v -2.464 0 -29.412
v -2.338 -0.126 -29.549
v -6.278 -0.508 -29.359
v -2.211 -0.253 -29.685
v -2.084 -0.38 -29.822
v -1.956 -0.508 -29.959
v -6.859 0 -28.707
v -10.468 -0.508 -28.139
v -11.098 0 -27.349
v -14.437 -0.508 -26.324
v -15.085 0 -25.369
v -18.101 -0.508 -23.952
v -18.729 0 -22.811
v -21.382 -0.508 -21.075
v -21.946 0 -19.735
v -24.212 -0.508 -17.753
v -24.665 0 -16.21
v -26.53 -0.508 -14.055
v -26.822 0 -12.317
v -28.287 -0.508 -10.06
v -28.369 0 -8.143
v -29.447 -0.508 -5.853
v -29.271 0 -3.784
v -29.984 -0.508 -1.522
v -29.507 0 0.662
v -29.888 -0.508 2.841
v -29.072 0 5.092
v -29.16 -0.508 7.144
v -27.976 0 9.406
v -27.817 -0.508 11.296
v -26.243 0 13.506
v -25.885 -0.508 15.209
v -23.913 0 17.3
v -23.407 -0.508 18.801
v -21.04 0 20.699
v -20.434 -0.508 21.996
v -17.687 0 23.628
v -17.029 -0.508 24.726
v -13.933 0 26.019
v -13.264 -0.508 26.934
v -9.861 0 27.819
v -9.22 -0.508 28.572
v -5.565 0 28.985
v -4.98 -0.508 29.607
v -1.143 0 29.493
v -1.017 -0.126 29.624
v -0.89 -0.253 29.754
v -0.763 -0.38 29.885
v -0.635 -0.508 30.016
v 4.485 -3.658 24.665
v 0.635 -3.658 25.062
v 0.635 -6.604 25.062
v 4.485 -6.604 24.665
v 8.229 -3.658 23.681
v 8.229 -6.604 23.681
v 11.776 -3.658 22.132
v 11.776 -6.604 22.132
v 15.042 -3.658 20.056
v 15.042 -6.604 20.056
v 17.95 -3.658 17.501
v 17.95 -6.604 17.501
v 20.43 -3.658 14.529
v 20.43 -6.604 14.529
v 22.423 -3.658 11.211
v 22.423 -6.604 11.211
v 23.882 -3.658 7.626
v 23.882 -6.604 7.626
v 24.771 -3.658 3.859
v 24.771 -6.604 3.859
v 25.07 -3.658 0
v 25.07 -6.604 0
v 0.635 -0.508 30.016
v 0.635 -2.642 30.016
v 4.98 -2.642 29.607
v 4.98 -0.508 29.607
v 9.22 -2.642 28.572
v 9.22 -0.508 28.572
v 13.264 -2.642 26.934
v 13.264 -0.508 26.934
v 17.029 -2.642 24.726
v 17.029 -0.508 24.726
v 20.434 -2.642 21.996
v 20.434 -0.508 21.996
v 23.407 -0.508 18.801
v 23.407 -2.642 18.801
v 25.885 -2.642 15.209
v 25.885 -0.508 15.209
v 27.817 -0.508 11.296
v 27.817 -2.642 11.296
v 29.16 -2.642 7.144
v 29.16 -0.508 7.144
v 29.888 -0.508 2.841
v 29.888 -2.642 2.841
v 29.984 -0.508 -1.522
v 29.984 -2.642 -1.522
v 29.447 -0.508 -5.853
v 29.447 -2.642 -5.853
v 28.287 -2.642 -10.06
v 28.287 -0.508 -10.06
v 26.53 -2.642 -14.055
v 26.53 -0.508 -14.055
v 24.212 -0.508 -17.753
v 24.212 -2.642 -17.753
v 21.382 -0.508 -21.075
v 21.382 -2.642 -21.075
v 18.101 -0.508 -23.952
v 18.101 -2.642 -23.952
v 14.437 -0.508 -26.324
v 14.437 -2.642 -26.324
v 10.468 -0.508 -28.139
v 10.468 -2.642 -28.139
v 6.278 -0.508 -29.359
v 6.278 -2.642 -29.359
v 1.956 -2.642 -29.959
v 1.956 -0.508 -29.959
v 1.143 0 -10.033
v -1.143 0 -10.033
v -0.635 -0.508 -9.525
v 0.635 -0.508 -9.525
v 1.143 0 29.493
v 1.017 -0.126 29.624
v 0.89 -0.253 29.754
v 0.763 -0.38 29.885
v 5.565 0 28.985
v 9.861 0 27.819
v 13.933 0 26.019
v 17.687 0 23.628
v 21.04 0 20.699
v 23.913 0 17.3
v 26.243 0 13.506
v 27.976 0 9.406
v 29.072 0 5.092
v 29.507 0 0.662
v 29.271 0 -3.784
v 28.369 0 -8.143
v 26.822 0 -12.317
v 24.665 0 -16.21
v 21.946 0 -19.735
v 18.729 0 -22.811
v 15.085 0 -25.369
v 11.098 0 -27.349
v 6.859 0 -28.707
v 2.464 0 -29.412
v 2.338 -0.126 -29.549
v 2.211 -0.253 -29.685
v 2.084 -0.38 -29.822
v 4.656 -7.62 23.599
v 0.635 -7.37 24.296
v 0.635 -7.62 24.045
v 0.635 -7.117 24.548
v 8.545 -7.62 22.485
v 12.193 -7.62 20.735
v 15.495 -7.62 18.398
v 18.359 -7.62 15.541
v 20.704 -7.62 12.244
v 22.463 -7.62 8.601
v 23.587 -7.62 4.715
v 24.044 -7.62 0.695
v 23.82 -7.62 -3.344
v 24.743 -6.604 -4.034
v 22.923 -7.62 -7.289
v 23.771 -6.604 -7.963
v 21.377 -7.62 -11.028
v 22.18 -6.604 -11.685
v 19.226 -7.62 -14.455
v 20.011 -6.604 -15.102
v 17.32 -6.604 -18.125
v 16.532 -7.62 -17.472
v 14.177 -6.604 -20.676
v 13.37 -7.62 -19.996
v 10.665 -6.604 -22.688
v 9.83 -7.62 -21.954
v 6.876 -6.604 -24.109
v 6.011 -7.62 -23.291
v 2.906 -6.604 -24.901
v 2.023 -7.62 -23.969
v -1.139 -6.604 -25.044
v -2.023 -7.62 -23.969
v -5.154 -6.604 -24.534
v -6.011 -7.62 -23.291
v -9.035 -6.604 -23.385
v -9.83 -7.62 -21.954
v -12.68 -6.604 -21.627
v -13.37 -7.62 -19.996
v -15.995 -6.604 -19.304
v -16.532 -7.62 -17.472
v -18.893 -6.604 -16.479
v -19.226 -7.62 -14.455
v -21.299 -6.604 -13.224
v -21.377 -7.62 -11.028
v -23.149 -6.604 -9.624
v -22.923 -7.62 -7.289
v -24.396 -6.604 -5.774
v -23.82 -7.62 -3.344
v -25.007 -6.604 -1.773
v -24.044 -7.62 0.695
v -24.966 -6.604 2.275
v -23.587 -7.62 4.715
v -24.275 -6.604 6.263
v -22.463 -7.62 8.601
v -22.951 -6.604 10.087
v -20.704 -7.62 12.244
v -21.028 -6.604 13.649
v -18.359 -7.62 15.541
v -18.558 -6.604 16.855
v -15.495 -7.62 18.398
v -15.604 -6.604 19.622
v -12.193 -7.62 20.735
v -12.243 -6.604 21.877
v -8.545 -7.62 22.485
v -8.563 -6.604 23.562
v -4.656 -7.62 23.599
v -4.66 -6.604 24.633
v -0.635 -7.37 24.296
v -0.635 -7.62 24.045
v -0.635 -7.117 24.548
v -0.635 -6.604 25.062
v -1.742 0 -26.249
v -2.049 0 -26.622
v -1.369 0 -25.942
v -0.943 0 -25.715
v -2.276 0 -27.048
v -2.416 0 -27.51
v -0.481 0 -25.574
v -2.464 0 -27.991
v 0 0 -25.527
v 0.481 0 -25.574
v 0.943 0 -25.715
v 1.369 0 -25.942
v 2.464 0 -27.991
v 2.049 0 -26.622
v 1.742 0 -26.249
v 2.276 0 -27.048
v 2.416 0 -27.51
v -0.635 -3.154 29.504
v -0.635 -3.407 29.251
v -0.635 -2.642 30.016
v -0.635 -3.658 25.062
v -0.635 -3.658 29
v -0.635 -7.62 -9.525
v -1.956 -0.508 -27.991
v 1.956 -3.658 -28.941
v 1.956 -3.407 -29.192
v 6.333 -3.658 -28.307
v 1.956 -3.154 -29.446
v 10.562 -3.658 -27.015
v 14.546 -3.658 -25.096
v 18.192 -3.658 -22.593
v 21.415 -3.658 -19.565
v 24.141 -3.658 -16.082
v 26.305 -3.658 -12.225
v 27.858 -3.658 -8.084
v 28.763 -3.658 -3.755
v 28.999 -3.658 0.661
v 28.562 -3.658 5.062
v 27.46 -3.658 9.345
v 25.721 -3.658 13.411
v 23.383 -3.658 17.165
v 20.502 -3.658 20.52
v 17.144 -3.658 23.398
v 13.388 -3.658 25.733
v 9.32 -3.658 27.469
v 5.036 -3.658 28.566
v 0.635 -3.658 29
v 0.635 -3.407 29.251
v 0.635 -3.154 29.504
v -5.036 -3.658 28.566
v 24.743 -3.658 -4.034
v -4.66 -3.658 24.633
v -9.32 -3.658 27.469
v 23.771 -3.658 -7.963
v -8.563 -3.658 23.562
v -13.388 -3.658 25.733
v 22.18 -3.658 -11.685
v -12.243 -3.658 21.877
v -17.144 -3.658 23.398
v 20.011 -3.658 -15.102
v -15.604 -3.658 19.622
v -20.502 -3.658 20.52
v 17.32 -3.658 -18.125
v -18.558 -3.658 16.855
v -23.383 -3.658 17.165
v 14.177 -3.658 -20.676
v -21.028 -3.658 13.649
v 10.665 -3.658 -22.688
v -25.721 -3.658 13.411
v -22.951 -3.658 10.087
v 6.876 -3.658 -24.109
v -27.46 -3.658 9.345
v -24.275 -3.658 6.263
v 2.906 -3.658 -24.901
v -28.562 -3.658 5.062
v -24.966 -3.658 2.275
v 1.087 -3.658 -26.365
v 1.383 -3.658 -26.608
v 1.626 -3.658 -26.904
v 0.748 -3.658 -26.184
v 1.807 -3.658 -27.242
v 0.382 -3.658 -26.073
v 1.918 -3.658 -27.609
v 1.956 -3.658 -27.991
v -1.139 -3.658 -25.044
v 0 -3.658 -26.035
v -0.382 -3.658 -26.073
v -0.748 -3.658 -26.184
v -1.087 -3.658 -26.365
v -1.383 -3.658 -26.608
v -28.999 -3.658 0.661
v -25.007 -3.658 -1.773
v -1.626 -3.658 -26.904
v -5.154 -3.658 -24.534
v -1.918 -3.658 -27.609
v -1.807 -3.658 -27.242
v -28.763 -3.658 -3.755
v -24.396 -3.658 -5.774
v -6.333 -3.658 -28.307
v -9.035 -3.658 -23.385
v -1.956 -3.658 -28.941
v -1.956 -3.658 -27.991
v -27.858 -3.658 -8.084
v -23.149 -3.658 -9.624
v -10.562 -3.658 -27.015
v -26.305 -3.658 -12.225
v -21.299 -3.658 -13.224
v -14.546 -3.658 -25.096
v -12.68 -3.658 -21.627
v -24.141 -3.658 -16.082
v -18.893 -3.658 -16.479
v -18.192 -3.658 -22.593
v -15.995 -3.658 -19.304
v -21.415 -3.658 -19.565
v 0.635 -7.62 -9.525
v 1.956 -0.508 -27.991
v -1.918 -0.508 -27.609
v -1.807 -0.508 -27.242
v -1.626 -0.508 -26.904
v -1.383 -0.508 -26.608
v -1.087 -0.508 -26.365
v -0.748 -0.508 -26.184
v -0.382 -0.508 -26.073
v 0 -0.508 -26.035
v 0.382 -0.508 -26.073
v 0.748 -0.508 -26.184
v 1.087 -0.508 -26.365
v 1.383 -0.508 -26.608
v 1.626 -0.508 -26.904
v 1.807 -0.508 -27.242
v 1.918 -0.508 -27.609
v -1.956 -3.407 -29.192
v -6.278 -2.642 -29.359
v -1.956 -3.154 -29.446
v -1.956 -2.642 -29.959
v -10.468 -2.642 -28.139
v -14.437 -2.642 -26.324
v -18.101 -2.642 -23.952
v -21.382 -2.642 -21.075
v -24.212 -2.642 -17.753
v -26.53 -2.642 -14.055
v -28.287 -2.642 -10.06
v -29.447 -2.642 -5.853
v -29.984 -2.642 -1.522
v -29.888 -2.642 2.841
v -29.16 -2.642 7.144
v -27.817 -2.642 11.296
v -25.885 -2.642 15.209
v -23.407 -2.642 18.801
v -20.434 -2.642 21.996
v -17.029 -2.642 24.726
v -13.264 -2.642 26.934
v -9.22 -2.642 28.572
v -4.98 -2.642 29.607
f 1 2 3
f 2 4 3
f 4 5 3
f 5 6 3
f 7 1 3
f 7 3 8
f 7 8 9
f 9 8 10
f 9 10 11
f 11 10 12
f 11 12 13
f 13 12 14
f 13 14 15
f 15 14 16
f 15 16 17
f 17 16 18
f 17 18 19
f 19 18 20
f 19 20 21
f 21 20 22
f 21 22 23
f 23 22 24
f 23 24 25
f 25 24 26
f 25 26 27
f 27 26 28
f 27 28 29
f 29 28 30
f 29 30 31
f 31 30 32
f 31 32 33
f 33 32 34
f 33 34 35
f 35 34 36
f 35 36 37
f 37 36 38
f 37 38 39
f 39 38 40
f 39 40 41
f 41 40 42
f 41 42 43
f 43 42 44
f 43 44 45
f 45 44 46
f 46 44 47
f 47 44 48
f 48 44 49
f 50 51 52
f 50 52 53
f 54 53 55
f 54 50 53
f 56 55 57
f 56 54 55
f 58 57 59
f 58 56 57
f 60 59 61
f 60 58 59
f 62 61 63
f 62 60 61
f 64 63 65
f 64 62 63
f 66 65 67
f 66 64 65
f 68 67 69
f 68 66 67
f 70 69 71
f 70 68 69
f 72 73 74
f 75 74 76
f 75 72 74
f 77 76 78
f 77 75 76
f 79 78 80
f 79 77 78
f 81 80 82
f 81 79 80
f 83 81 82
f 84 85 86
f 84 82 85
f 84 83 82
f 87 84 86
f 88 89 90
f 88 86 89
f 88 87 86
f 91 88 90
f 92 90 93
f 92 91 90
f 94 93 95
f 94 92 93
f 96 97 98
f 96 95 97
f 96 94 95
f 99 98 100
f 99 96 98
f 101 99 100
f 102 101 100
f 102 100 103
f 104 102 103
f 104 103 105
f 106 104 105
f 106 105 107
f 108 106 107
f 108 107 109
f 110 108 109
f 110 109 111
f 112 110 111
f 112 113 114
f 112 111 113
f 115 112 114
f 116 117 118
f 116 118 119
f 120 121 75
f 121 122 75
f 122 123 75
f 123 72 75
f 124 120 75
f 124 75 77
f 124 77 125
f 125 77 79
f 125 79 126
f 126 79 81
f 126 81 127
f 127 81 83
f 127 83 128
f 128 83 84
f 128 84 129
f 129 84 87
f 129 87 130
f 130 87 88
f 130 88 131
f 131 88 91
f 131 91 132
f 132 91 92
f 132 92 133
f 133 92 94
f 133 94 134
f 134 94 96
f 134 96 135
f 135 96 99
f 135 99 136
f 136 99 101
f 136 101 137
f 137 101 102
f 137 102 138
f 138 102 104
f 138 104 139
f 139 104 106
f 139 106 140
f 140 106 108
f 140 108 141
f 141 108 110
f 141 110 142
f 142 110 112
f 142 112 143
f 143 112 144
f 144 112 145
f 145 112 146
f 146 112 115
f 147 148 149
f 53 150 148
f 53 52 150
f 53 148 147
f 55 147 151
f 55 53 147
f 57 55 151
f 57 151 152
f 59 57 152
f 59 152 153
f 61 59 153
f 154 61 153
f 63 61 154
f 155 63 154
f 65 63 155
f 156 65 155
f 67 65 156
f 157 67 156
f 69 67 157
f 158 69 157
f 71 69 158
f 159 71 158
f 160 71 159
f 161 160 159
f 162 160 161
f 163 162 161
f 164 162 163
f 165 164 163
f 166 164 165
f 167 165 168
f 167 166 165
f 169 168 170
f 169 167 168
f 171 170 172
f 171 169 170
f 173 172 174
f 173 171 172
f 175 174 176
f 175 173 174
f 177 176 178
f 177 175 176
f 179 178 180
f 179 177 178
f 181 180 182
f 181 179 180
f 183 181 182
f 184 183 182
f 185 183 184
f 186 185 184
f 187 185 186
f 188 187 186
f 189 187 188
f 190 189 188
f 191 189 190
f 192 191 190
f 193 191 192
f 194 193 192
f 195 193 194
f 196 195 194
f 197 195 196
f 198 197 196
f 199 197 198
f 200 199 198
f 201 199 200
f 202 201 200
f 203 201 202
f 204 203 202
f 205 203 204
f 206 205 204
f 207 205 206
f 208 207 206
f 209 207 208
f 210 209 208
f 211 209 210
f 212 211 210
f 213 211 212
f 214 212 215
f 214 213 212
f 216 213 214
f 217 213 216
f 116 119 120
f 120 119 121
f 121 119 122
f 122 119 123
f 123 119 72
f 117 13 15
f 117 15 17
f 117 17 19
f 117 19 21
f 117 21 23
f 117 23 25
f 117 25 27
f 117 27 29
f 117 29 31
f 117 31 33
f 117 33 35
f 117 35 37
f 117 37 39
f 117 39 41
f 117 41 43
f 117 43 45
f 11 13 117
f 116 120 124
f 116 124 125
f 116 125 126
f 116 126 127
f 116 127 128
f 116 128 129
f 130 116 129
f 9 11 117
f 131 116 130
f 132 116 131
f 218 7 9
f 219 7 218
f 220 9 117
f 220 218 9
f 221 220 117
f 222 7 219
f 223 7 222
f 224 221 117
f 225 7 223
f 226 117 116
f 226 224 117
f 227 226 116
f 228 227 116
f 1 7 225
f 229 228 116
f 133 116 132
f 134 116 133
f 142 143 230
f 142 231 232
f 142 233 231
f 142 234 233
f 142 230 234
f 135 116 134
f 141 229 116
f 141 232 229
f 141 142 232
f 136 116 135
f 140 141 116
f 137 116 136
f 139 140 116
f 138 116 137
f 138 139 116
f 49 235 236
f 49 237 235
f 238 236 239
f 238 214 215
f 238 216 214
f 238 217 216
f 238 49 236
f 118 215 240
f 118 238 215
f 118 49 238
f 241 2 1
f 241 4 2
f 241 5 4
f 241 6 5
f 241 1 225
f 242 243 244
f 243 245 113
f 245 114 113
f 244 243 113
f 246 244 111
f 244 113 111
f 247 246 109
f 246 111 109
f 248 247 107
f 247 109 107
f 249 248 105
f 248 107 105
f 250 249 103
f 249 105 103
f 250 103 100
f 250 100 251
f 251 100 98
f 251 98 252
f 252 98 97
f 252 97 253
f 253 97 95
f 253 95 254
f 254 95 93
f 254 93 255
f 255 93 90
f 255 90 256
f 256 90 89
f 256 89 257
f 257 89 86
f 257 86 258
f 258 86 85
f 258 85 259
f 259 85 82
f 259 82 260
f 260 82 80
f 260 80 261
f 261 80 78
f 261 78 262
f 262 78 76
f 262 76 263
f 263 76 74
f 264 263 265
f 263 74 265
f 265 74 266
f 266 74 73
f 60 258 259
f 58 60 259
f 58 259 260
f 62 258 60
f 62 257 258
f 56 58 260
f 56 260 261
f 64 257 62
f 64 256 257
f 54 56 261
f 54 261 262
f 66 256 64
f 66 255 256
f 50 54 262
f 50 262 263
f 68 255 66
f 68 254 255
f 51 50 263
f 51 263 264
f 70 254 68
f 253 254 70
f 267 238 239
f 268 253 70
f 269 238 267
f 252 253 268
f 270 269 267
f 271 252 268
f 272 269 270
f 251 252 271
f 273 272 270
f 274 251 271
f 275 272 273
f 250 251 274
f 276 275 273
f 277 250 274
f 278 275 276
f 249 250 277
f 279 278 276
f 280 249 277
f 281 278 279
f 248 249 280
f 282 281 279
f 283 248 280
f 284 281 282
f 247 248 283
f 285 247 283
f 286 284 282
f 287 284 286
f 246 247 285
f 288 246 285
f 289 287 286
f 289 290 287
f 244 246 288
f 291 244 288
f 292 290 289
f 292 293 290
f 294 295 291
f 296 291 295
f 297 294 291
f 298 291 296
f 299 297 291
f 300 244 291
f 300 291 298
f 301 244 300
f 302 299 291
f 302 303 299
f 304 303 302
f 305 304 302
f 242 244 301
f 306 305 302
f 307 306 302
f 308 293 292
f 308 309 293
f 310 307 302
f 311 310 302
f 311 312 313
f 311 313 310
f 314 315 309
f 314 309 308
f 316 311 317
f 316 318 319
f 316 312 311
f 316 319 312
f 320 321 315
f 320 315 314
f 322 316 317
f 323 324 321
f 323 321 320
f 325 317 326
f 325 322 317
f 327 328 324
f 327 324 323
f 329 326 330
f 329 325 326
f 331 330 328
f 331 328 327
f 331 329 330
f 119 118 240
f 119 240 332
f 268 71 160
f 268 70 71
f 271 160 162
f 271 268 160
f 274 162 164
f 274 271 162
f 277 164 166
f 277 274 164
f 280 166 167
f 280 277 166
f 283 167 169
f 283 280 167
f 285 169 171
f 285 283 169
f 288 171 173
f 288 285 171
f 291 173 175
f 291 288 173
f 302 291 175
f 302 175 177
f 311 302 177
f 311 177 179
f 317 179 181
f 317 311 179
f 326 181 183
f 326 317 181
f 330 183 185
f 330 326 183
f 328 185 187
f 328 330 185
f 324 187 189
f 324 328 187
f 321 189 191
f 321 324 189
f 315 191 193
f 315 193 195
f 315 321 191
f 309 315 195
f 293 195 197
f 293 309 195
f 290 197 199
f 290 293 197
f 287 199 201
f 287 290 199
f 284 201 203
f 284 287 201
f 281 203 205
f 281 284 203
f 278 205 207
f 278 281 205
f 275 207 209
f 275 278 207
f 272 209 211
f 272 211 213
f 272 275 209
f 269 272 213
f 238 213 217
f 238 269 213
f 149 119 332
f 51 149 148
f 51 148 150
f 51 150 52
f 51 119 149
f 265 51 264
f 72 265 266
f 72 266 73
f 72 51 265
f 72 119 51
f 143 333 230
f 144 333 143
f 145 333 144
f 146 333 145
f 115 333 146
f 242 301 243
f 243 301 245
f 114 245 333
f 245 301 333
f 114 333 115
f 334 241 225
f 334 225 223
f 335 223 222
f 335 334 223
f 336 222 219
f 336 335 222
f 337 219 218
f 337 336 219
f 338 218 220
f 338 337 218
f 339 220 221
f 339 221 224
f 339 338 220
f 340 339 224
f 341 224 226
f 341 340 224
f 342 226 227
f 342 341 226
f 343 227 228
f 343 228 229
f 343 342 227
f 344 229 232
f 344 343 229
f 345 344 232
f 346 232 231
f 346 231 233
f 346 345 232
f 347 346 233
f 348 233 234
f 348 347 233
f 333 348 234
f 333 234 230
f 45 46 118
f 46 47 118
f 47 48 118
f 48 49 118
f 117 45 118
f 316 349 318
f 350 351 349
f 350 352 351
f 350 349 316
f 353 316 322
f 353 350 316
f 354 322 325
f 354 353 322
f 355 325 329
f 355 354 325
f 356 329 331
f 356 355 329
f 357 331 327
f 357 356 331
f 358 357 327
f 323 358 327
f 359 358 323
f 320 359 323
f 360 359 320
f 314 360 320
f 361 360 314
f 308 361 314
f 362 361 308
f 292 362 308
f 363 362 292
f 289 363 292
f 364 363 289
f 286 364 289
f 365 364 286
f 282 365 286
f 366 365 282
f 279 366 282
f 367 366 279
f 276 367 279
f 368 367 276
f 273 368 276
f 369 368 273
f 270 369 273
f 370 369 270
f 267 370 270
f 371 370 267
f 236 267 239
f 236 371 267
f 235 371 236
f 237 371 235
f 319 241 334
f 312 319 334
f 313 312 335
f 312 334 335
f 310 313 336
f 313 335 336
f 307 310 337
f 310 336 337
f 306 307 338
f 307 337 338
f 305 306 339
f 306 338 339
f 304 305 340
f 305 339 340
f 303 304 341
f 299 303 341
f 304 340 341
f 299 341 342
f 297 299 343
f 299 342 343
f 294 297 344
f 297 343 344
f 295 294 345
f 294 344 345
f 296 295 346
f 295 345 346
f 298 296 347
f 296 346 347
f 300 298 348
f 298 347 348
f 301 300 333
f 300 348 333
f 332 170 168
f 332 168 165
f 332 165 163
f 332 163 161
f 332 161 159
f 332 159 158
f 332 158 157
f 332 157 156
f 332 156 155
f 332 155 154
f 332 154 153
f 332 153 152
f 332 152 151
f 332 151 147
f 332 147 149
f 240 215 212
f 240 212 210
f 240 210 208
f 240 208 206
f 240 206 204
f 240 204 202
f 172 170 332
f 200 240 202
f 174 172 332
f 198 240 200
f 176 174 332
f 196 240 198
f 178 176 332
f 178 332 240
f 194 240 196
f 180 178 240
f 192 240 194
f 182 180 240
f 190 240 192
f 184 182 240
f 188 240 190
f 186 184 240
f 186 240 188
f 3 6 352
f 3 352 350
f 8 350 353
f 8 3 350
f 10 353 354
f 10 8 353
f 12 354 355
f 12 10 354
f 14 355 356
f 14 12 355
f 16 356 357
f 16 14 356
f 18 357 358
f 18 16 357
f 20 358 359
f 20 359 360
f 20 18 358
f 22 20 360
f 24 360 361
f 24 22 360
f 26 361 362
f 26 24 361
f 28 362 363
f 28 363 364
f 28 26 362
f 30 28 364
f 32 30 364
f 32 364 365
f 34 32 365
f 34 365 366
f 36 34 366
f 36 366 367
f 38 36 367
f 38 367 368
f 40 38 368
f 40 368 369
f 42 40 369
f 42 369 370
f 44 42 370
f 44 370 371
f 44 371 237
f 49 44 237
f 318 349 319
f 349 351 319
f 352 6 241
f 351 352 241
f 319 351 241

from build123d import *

# Parameters (mm, degrees)
CUT_EXTRUDE2_DEPTH = 8.62
CUT_EXTRUDE3_DEPTH = 8.62
CHAMFER1_SIZE      = 1.016
CHAMFER2_SIZE      = 0.508


with BuildPart() as part:
    # Sketch1 → Revolve1 (revolve)
    with BuildSketch(Plane.XY):
        Polygon((0, 0), (0, -7.62), (25.0698, -7.62), (25.0698, -3.6576), (30.0228, -3.6576), (30.0228, 0), align=None)
    revolve(axis=Axis((0, -1000, 0), (0, 1, 0)))

    # Sketch3 → Cut-Extrude2 (cut, through all)
    with BuildSketch(Plane(origin=(0, 0, 0), x_dir=(1, 0, 0), z_dir=(0, 1, 0))):
        with BuildLine():
            Line((-0.635, 9.525), (0.635, 9.525))
            Line((0.635, 9.525), (0.635, -30.016083936))
            ThreePointArc((0.635, -30.016083936), (0, -30.0228), (-0.635, -30.016083936))
            Line((-0.635, -30.016083936), (-0.635, 9.525))
        make_face()
    extrude(amount=-CUT_EXTRUDE2_DEPTH, mode=Mode.SUBTRACT)

    # Sketch5 → Cut-Extrude3 (cut, through all)
    with BuildSketch(Plane(origin=(0, 0, 0), x_dir=(1, 0, 0), z_dir=(0, 1, 0))):
        with BuildLine():
            Line((-1.9558, 29.959028125), (-1.9558, 27.9908))
            ThreePointArc((-1.9558, 27.9908), (0, 26.035), (1.9558, 27.9908))
            Line((1.9558, 27.9908), (1.9558, 29.959028125))
            ThreePointArc((1.9558, 29.959028125), (0, 30.0228), (-1.9558, 29.959028125))
        make_face()
    extrude(amount=-CUT_EXTRUDE3_DEPTH, mode=Mode.SUBTRACT)

    # Chamfer1
    chamfer1_edges = [part.edges().sort_by_distance(p)[0] for p in [
        (-30.015522282, -3.6576, 0.661015886),
        (-17.501079239, -7.62, -17.950128064),
        (30.015522282, -3.6576, 0.661015886),
    ]]
    chamfer(chamfer1_edges, length=CHAMFER1_SIZE)

    # Chamfer2
    chamfer2_edges = [part.edges().sort_by_distance(p)[0] for p in [
        (-30.015522282, 0, 0.661015886),
        (-0.635, 0, 10.245541968),
        (0.635, 0, 10.245541968),
        (0, 0, -9.525),
        (30.015522282, 0, 0.661015886),
        (-1.9558, 0, -28.974914063),
        (0, 0, -26.035),
        (1.9558, 0, -28.974914063),
    ]]
    chamfer(chamfer2_edges, length=CHAMFER2_SIZE)


solid = part.part
